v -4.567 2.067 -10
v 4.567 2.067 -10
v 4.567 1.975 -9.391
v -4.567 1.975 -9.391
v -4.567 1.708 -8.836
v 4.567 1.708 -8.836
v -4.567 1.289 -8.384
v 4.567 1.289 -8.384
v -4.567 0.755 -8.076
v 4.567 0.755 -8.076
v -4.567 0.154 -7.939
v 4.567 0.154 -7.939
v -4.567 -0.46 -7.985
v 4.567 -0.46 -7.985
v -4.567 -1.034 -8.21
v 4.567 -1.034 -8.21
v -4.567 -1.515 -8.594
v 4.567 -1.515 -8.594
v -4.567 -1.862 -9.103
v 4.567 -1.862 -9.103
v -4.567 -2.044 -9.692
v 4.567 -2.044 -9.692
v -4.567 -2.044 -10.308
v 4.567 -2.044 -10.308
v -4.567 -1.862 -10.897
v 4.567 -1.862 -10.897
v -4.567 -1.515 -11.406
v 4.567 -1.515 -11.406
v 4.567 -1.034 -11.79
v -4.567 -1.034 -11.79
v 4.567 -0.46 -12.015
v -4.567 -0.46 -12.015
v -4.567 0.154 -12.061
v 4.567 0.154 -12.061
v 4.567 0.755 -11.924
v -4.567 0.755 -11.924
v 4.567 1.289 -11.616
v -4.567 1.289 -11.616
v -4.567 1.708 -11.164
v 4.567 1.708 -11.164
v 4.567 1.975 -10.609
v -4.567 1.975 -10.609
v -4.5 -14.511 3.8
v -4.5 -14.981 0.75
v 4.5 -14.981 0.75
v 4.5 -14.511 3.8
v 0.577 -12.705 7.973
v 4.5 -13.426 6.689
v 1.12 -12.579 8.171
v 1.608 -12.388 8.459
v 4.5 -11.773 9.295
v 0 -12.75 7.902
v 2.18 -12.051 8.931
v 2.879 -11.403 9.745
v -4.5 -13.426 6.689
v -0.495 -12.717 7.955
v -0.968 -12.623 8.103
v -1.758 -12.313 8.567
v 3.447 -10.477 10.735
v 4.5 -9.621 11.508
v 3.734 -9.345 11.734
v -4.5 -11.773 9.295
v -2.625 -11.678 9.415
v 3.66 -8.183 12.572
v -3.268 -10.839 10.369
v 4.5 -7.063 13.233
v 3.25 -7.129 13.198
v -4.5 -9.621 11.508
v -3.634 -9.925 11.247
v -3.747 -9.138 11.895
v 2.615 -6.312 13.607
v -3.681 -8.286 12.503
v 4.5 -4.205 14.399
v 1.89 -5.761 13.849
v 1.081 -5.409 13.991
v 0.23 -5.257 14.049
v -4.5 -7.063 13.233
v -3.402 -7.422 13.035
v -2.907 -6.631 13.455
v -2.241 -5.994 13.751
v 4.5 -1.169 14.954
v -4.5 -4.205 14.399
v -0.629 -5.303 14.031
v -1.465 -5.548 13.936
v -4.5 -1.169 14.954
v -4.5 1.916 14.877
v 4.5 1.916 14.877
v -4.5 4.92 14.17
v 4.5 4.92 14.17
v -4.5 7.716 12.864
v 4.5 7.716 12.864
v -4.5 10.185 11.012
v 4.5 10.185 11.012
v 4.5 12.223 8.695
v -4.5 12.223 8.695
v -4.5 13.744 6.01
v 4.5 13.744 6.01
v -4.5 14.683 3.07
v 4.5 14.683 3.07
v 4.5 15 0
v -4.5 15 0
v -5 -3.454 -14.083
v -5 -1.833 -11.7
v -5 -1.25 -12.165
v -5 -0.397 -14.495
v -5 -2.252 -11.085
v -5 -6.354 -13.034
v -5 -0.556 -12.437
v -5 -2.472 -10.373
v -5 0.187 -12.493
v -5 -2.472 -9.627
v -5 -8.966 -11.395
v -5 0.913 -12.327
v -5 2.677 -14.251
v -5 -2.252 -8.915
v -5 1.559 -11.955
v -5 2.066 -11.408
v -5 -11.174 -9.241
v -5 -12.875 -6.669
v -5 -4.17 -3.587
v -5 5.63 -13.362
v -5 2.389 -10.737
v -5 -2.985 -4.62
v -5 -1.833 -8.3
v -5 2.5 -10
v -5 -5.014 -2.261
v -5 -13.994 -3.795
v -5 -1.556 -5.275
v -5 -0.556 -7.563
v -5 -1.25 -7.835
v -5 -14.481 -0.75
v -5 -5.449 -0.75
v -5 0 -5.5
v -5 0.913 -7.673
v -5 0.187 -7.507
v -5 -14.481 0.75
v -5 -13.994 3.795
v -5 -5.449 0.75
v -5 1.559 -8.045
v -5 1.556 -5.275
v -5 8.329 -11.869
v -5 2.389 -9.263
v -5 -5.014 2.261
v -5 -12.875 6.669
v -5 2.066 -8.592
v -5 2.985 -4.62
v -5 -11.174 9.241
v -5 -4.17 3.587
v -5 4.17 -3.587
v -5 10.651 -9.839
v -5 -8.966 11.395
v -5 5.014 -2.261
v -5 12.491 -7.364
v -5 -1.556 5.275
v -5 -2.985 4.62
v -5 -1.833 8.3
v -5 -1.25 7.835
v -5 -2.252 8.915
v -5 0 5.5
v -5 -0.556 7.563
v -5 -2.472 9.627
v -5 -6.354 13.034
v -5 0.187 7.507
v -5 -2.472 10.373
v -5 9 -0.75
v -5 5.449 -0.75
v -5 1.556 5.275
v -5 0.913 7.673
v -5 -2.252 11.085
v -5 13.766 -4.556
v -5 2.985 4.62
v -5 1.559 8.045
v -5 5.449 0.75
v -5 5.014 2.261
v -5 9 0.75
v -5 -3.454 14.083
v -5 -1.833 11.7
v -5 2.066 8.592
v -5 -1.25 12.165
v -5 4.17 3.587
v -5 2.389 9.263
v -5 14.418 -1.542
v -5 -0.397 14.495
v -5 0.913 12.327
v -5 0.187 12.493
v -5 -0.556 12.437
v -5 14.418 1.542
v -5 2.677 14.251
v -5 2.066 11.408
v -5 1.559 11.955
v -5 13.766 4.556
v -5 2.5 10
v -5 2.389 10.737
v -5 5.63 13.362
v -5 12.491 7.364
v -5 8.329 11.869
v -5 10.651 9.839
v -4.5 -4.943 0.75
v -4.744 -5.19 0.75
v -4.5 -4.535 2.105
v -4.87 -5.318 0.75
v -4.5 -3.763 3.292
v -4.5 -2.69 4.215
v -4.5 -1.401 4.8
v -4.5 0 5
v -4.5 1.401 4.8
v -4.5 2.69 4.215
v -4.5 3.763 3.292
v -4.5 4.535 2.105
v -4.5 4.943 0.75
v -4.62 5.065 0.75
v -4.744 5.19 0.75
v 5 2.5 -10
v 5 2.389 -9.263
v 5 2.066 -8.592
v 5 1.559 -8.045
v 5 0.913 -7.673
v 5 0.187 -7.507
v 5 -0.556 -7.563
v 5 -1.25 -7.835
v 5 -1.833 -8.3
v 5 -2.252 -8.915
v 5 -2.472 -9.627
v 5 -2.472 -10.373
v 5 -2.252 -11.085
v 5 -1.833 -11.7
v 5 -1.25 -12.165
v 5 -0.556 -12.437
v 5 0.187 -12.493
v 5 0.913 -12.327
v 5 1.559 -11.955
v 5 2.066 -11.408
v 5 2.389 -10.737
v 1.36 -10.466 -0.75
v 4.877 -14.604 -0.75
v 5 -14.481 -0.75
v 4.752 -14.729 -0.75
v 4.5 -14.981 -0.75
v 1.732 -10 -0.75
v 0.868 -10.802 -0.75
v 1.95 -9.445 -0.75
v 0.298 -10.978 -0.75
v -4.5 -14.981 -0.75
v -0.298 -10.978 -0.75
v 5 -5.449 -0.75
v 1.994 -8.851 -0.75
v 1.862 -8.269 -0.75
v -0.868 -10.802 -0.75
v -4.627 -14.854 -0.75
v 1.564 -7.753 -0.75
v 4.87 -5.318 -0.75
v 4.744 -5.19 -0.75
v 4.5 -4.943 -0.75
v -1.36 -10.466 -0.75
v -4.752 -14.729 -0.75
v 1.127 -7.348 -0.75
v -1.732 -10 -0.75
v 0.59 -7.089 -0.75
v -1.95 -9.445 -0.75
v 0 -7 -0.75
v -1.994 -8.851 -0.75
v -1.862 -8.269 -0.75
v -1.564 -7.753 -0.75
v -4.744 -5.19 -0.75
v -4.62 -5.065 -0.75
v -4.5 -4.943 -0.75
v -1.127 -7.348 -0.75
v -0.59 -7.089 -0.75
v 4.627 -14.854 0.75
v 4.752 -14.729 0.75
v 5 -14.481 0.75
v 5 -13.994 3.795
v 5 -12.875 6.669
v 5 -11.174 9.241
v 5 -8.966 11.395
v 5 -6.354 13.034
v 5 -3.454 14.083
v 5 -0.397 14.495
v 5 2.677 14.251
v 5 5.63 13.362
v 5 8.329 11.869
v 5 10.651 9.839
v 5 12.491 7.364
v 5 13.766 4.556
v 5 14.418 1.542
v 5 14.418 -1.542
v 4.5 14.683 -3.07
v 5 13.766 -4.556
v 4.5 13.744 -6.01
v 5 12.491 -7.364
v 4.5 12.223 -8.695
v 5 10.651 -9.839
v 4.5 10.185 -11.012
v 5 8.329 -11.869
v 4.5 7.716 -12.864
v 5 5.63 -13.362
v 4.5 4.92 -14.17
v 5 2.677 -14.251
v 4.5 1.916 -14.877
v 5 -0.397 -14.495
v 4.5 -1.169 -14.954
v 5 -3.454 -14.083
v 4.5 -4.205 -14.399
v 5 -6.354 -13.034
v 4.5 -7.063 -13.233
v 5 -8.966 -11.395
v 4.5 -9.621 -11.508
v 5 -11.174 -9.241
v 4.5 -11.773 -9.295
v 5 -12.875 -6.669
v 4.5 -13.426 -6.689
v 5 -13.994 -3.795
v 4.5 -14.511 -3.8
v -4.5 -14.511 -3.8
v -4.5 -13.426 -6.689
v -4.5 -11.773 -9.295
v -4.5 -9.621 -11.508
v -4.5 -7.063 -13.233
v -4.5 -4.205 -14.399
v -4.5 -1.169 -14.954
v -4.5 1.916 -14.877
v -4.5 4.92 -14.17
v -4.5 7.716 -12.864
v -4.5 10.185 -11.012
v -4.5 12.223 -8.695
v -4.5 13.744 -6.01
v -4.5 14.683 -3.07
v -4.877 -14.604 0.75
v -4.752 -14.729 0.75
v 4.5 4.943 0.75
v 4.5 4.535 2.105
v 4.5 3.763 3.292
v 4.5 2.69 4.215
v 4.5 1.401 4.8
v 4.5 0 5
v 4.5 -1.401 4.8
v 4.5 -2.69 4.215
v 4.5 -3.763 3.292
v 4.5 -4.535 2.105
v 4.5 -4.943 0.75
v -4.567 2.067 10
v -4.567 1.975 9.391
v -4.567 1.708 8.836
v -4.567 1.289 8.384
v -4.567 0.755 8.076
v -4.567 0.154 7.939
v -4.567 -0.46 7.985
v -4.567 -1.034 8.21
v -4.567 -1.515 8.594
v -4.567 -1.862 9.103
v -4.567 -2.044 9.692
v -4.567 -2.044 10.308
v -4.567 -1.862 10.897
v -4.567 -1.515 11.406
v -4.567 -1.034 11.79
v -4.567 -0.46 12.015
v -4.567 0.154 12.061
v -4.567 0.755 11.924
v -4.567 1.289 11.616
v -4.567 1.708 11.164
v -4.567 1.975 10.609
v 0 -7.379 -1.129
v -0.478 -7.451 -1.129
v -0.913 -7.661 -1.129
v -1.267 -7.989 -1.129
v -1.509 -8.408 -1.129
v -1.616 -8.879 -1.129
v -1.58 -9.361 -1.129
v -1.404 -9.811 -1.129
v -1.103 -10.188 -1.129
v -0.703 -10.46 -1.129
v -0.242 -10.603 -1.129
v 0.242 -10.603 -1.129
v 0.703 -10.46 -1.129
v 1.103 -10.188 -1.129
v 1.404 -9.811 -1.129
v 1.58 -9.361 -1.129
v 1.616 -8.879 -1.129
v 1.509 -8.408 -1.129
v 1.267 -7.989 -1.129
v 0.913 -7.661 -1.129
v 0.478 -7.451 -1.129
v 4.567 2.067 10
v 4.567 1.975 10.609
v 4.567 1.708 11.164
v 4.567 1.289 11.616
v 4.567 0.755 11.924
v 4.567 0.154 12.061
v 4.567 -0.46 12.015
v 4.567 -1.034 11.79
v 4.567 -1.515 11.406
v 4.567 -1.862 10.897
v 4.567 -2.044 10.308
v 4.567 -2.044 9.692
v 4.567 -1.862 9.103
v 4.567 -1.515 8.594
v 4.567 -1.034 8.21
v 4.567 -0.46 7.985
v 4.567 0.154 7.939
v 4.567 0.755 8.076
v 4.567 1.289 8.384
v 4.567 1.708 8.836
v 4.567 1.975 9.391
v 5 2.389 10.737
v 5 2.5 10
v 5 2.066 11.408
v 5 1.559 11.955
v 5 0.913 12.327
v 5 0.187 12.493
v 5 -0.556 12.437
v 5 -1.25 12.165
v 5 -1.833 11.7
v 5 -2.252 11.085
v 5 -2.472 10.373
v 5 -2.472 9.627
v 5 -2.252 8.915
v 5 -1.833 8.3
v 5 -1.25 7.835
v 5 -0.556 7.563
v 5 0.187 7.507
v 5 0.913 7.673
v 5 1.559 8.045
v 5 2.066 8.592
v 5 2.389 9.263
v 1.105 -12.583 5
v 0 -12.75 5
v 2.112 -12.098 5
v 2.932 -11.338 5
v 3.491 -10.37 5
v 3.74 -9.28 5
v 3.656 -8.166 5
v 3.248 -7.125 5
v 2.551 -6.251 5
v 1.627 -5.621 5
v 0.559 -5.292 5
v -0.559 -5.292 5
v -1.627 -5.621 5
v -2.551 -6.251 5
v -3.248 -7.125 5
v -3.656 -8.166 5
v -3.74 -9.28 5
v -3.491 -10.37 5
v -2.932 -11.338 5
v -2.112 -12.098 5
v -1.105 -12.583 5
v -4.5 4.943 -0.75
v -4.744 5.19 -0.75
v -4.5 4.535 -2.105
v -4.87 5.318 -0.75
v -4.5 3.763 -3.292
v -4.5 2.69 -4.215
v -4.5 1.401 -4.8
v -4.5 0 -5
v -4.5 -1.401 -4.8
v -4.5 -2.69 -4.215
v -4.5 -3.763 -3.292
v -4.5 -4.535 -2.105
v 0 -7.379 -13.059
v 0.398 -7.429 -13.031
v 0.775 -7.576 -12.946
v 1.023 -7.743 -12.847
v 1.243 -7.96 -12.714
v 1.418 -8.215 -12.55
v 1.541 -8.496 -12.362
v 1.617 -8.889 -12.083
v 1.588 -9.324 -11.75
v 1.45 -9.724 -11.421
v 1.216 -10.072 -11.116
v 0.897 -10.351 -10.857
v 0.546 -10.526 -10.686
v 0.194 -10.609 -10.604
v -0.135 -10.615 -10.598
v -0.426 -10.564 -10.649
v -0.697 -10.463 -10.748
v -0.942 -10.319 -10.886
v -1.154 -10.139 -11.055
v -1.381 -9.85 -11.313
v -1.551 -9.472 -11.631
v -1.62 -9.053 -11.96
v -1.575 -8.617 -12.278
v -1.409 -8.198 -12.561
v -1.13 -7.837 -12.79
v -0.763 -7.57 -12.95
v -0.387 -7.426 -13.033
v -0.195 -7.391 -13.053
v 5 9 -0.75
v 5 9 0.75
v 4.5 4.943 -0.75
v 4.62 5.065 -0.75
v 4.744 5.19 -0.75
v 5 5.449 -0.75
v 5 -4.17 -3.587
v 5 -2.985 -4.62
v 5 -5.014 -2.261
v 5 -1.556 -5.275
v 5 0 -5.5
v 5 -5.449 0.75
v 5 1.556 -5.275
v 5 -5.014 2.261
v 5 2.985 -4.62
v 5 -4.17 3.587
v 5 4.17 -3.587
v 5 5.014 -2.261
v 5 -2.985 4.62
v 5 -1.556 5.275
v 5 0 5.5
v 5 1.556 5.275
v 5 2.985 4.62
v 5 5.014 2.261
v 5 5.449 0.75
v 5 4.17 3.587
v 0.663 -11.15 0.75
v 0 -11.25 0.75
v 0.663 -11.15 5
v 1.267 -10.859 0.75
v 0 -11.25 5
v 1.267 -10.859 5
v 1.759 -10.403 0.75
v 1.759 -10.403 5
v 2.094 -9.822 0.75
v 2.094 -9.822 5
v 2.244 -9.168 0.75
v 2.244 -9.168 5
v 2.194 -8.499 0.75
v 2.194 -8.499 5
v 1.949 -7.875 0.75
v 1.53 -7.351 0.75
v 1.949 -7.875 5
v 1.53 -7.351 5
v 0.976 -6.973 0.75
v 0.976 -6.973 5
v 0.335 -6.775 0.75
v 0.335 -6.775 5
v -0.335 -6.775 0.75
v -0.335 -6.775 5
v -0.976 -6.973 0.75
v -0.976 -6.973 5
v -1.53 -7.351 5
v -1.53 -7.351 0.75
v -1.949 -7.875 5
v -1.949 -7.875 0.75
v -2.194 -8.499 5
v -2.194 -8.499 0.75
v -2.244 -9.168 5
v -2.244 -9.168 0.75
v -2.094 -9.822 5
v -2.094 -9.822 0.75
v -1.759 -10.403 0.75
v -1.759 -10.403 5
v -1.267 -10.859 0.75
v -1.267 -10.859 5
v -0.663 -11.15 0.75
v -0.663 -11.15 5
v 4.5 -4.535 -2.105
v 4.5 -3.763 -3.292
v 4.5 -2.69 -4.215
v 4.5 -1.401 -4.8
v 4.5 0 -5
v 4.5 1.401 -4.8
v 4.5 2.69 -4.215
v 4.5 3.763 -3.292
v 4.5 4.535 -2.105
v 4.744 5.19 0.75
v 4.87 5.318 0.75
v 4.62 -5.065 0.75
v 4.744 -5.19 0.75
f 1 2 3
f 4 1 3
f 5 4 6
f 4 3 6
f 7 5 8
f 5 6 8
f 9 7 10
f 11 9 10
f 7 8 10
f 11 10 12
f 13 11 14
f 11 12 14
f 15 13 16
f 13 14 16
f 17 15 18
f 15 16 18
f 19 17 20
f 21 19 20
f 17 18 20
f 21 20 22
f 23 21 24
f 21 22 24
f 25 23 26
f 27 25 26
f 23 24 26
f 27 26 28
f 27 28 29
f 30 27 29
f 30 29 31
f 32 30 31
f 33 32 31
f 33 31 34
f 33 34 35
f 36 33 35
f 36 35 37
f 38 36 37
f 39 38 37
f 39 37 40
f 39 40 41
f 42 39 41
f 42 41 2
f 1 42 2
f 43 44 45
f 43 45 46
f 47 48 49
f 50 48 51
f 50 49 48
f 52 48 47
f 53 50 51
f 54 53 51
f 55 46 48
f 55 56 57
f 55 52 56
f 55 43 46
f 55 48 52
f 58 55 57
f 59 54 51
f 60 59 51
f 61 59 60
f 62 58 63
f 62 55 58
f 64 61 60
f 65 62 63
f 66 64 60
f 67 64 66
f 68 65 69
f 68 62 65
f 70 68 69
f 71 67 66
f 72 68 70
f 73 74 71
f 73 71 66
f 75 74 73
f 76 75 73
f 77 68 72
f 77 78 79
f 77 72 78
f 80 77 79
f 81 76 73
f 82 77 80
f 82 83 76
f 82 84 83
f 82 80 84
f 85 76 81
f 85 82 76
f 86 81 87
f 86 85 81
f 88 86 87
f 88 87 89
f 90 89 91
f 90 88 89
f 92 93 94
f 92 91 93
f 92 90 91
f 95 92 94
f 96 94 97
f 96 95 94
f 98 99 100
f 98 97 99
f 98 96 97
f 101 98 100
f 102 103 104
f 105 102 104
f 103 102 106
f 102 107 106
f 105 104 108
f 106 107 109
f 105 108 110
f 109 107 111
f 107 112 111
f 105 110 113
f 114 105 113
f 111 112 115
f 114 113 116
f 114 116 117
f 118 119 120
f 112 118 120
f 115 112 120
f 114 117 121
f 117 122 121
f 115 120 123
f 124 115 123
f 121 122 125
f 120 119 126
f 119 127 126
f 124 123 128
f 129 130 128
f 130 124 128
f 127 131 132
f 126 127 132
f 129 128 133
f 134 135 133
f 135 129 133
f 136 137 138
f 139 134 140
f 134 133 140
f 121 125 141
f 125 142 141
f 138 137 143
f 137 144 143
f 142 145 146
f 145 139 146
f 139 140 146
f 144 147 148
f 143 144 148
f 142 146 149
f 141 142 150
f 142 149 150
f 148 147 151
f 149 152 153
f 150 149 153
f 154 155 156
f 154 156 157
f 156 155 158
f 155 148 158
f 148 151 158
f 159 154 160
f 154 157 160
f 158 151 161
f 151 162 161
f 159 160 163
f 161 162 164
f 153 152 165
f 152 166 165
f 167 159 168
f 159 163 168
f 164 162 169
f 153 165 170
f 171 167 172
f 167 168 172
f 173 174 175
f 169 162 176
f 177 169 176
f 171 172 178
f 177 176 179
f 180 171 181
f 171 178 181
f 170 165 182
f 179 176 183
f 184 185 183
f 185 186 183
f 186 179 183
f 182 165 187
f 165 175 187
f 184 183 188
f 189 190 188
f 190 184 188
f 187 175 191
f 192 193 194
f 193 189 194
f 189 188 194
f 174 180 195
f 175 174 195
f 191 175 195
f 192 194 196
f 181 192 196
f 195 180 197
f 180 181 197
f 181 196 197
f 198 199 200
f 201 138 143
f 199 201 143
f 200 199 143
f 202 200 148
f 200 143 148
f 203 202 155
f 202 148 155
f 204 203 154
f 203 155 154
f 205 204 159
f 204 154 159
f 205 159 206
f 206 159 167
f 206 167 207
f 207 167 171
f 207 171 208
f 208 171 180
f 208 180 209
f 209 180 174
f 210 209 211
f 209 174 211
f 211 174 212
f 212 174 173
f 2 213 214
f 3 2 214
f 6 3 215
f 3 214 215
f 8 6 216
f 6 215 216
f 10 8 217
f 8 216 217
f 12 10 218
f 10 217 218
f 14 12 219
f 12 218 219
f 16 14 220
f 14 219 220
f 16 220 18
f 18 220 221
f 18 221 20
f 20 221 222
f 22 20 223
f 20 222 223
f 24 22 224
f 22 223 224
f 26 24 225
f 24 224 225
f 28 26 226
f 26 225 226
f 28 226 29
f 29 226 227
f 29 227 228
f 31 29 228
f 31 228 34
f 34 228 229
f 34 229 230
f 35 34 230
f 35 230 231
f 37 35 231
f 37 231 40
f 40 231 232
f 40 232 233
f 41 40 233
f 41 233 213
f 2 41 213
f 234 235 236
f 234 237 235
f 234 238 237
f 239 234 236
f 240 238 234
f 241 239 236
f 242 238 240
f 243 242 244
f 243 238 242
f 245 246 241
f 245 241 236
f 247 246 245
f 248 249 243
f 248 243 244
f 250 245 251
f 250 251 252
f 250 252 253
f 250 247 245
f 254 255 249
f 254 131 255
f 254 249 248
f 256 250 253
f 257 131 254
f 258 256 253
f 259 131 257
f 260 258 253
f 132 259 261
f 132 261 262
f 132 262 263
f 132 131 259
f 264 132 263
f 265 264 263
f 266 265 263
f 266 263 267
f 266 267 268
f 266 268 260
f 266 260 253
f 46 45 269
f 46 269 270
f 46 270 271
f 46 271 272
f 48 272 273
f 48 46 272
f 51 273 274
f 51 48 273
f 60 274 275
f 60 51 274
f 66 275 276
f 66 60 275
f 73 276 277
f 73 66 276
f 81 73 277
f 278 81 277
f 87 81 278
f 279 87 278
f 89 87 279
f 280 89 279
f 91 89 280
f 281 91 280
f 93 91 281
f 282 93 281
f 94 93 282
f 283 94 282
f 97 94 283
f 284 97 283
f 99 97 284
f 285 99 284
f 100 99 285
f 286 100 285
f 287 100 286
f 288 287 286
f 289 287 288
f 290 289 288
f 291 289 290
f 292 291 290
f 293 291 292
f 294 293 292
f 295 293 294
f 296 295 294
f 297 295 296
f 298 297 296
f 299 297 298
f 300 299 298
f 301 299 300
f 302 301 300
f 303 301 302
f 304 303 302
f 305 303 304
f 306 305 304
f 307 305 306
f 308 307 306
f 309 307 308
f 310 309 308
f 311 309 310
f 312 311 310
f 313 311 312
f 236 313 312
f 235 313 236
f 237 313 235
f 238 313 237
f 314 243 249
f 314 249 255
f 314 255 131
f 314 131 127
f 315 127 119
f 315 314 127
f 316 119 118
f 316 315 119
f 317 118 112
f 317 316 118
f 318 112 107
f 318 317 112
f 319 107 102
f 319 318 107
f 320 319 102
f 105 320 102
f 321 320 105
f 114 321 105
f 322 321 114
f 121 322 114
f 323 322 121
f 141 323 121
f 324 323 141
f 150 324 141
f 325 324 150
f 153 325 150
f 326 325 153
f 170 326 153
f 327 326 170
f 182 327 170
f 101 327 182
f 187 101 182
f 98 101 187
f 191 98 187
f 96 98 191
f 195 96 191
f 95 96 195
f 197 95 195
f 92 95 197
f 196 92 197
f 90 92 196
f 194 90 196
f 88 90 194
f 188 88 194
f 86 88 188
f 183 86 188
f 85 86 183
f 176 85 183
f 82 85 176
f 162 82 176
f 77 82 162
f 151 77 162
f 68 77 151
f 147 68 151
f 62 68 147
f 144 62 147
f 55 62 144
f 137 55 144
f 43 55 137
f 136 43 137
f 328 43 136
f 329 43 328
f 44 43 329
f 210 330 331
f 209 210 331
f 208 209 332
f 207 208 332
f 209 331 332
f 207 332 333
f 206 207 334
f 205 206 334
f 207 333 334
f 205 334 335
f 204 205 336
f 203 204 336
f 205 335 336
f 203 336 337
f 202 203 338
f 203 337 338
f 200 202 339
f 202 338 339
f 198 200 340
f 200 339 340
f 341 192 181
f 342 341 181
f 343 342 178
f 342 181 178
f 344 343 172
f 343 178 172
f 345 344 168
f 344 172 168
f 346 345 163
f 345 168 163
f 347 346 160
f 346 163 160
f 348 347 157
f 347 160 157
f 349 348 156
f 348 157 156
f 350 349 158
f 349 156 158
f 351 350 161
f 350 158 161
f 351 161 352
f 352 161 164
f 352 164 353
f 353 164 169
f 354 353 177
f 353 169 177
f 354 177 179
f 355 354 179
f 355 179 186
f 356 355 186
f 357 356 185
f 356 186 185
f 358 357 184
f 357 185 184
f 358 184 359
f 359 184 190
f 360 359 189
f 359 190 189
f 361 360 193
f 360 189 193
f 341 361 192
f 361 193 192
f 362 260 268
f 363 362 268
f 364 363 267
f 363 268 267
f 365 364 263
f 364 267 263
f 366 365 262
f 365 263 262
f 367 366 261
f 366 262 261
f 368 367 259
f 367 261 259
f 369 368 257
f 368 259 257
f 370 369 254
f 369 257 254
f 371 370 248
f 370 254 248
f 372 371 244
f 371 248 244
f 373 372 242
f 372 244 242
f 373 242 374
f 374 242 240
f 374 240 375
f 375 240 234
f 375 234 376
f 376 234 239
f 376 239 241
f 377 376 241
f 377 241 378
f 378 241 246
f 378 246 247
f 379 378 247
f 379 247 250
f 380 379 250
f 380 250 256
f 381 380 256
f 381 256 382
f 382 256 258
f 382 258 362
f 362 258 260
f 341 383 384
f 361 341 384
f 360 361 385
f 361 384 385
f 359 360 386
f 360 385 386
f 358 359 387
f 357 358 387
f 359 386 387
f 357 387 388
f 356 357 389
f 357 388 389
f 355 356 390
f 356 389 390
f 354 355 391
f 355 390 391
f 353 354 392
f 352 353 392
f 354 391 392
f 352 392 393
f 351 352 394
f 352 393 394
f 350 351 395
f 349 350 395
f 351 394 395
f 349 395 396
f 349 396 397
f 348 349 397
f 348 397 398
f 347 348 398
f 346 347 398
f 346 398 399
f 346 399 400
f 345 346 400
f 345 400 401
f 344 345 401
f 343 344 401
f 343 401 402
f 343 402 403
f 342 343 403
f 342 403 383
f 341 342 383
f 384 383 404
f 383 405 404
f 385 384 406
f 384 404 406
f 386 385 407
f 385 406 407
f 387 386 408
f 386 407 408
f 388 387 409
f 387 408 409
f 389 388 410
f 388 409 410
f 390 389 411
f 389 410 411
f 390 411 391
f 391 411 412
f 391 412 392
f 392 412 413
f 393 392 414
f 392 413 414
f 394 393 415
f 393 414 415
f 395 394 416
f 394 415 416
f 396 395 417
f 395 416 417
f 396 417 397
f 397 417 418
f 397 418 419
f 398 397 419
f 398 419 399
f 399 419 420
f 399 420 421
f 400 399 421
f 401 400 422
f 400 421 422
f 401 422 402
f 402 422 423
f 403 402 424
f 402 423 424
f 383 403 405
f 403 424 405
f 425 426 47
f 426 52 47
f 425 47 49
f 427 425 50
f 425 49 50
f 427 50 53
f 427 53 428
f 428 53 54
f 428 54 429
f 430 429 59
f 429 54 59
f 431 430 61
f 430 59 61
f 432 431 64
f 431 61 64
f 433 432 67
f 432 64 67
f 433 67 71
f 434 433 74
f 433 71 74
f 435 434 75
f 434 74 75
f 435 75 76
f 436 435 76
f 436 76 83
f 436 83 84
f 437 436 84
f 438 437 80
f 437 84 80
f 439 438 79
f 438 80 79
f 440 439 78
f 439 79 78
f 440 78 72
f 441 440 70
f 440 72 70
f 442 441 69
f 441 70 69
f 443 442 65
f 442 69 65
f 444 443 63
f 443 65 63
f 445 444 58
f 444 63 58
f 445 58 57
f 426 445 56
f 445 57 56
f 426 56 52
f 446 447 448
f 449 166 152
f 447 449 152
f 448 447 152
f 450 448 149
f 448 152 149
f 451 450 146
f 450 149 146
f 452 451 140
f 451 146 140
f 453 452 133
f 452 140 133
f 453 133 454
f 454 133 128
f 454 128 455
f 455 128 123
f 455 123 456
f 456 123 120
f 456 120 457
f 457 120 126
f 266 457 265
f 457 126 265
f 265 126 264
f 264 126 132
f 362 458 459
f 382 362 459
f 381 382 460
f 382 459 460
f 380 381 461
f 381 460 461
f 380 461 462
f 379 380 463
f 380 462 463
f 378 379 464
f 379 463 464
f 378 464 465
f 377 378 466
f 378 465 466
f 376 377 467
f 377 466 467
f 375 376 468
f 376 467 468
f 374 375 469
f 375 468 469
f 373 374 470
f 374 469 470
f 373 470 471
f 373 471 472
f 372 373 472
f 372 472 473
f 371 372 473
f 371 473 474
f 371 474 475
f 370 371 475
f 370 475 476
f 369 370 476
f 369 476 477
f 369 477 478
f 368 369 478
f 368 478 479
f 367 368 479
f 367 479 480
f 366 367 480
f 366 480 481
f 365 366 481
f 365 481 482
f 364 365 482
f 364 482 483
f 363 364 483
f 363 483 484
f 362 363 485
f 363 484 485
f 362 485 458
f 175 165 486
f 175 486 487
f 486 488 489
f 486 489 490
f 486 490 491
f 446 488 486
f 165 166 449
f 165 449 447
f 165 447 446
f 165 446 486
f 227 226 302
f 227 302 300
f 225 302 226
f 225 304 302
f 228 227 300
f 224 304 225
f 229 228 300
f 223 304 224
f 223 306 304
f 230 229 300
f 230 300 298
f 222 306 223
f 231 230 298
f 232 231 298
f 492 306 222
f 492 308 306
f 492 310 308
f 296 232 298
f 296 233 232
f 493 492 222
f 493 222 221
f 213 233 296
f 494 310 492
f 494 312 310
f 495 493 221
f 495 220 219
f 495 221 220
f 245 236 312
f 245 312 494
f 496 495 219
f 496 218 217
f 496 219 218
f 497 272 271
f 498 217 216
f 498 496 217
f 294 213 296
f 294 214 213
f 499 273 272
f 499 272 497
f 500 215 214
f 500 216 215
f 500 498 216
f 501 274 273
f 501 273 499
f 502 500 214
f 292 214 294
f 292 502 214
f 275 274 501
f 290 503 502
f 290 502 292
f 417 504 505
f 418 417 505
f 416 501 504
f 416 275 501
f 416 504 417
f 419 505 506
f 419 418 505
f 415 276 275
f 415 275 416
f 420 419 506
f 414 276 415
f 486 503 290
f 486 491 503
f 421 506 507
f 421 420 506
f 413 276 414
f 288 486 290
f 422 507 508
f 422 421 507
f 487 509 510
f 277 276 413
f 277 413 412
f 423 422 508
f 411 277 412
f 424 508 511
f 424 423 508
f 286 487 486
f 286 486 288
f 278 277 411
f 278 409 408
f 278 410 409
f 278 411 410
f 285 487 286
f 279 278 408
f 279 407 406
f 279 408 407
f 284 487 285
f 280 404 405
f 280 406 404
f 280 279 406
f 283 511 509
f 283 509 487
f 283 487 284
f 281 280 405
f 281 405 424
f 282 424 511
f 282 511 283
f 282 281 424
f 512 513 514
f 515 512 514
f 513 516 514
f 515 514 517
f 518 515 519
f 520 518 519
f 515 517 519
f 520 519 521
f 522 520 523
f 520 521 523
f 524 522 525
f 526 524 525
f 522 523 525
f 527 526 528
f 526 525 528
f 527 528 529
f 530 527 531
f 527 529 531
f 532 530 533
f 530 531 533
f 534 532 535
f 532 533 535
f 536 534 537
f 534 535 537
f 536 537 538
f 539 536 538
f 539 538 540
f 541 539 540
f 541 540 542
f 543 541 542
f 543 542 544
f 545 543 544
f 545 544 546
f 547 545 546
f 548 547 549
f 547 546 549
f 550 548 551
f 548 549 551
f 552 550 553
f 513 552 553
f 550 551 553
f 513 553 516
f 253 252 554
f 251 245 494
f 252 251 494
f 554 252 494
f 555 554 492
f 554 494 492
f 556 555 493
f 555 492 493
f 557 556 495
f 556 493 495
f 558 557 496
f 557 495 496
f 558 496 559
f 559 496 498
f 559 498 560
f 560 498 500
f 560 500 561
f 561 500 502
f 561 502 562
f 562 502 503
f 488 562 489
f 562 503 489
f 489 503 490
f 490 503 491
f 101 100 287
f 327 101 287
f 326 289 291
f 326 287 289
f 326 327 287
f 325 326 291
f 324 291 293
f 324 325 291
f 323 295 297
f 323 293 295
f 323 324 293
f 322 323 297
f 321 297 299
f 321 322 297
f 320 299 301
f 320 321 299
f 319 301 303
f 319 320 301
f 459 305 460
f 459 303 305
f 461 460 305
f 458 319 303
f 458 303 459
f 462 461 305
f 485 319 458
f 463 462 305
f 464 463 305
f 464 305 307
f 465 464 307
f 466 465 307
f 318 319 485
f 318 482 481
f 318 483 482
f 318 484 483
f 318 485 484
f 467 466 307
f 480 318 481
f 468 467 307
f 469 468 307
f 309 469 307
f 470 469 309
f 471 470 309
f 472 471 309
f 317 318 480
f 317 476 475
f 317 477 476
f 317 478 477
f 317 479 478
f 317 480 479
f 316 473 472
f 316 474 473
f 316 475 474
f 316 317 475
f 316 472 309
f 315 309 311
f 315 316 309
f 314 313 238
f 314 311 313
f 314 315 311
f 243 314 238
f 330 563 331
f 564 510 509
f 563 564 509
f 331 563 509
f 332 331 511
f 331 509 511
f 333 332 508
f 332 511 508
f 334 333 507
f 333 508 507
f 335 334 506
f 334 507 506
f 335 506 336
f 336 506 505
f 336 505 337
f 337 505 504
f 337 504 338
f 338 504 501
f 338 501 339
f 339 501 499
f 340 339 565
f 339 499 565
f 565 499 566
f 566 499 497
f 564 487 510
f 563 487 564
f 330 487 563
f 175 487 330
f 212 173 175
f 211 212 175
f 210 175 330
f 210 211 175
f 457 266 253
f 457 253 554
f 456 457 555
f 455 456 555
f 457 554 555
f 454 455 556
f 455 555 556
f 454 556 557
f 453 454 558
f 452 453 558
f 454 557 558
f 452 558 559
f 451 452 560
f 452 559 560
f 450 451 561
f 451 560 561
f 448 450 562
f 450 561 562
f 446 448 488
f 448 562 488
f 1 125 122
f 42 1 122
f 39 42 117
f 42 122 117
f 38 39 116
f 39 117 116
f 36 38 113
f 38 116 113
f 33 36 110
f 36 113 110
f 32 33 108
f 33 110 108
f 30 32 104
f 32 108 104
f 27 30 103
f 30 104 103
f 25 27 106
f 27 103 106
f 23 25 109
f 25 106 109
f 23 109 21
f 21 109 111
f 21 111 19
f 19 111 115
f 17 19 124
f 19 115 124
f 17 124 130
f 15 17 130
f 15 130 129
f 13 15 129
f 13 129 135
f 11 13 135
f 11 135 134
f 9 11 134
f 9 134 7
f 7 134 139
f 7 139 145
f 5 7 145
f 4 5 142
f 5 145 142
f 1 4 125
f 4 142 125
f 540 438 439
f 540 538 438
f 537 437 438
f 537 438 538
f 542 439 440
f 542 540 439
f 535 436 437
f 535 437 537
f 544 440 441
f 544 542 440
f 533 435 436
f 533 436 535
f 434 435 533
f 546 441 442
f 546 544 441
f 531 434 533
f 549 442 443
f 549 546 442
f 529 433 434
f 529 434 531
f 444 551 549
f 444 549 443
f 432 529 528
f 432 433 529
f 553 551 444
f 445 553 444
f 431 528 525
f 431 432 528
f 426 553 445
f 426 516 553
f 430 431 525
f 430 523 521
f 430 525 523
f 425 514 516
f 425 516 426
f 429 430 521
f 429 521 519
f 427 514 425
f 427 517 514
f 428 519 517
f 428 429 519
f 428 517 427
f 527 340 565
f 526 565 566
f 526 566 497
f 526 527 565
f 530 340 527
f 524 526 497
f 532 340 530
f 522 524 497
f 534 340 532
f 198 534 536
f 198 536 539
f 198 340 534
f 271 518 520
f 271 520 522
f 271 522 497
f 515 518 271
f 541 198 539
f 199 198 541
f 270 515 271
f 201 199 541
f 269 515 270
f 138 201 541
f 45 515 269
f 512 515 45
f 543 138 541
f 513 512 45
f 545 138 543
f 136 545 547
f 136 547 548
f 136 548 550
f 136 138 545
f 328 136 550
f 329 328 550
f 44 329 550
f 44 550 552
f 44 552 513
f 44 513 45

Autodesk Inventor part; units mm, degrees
sketch "Sketch_1" plane through (0, 0, 0) normal (0, 0, 1) x (1, 0, 0)
  line L0 (5, 0) -> (-5, 0)
  line L1 (-5, 14.5) -> (-5, 5.5)
  line L2 (-5, 5.5) -> (-4.5, 5)
  line L3 (-4.5, 5) -> (4.5, 5)
  line L4 (4.5, 5) -> (5, 5.5)
  line L5 (5, 5.5) -> (5, 14.5)
  line L6 (5, 14.5) -> (4.5, 15)
  line L7 (4.5, 15) -> (-4.5, 15)
  line L8 (-4.5, 15) -> (-5, 14.5)
revolve "Revolution1" add sketch "Sketch_1" angle 360 about axis through (5, 0, 0) along (1, 0, 0)
sketch "Sketch_2" plane through (0, 0, 0) normal (1, 0, 0) x (0, 1, 0)
  line L0 (-15, 0.75) -> (-15, -0.75)
  line L1 (-15, -0.75) -> (9, -0.75)
  line L2 (9, -0.75) -> (9, 0.75)
  line L3 (9, 0.75) -> (-15, 0.75)
extrude "Extrusion1" cut sketch "Sketch_2" along normal mid plane 10
sketch "Sketch_3" plane through (0, 0, 0) normal (1, 0, 0) x (0, 1, 0)
  line L0 (-9, 15) -> (-9, 0)
  line L1 (-9, 0) -> (-11.25, 0)
  line L2 (-11.25, 0) -> (-11.25, 5)
  line L3 (-11.25, 5) -> (-12.75, 5)
  line L4 (-12.75, 5) -> (-12.75, 15)
  line L5 (-12.75, 15) -> (-9, 15)
  line L6 (-9, 15) -> (-9, 0)
revolve "Revolution2" cut sketch "Sketch_3" angle 360 about axis through (0, -9, 15) along (0, 0, 1)
sketch "Sketch_4" plane through (0, 0, 0) normal (1, 0, 0) x (0, 1, 0)
  line L0 (-9, -14.25) -> (-9, -0.75)
  line L1 (-9, -0.75) -> (-7, -0.75)
  line L2 (-7, -0.75) -> (-7.379, -1.129)
  line L3 (-7.379, -1.129) -> (-7.379, -14.25)
  line L4 (-7.379, -14.25) -> (-9, -14.25)
  line L5 (-9, -14.25) -> (-9, -0.75)
revolve "Revolution3" cut sketch "Sketch_4" angle 360 about axis through (0, -9, -14.25) along (0, 0, -1)
thread "Thread1" size "M4x0.7" class "6H" standard "ISO Metric profile" length 12.1375
sketch "Sketch_7" plane through (0, 0, -10) normal (0, 0, 1) x (1, 0, 0)
  line L0 (5, 0) -> (-5, 0)
  line L1 (-5, 0) -> (-5, 2.5)
  line L2 (-5, 2.5) -> (-4.567, 2.067)
  line L3 (-4.567, 2.067) -> (4.567, 2.067)
  line L4 (4.567, 2.067) -> (5, 2.5)
  line L5 (5, 2.5) -> (5, 0)
  line L6 (5, 0) -> (-5, 0)
revolve "Revolution4" cut sketch "Sketch_7" angle 360 about axis through (5, 0, -10) along (1, 0, 0)
thread "Thread2" size "M5x0.8" class "6H" standard "ISO Metric profile" full length
sketch "Sketch_8" plane through (0, 0, 10) normal (0, 0, 1) x (1, 0, 0)
  line L0 (5, 0) -> (-5, 0)
  line L1 (-5, 0) -> (-5, 2.5)
  line L2 (-5, 2.5) -> (-4.567, 2.067)
  line L3 (-4.567, 2.067) -> (4.567, 2.067)
  line L4 (4.567, 2.067) -> (5, 2.5)
  line L5 (5, 2.5) -> (5, 0)
  line L6 (5, 0) -> (-5, 0)
revolve "Revolution5" cut sketch "Sketch_8" angle 360 about axis through (5, 0, 10) along (1, 0, 0)
thread "Thread3" size "M5x0.8" class "6H" standard "ISO Metric profile" full length
ref_plane "body_screw_XY" through (0, -9, 5) normal (0, 0, 1) x (1, 0, 0)
ref_plane "body_screw_YZ" through (0, -9, 5) normal (1, 0, 0) x (0, 1, 0)
ref_plane "body_screw_ZX" through (0, -9, 5) normal (0, 1, 0) x (0, 0, 1)
properties part number "SSCSW10-10b"
